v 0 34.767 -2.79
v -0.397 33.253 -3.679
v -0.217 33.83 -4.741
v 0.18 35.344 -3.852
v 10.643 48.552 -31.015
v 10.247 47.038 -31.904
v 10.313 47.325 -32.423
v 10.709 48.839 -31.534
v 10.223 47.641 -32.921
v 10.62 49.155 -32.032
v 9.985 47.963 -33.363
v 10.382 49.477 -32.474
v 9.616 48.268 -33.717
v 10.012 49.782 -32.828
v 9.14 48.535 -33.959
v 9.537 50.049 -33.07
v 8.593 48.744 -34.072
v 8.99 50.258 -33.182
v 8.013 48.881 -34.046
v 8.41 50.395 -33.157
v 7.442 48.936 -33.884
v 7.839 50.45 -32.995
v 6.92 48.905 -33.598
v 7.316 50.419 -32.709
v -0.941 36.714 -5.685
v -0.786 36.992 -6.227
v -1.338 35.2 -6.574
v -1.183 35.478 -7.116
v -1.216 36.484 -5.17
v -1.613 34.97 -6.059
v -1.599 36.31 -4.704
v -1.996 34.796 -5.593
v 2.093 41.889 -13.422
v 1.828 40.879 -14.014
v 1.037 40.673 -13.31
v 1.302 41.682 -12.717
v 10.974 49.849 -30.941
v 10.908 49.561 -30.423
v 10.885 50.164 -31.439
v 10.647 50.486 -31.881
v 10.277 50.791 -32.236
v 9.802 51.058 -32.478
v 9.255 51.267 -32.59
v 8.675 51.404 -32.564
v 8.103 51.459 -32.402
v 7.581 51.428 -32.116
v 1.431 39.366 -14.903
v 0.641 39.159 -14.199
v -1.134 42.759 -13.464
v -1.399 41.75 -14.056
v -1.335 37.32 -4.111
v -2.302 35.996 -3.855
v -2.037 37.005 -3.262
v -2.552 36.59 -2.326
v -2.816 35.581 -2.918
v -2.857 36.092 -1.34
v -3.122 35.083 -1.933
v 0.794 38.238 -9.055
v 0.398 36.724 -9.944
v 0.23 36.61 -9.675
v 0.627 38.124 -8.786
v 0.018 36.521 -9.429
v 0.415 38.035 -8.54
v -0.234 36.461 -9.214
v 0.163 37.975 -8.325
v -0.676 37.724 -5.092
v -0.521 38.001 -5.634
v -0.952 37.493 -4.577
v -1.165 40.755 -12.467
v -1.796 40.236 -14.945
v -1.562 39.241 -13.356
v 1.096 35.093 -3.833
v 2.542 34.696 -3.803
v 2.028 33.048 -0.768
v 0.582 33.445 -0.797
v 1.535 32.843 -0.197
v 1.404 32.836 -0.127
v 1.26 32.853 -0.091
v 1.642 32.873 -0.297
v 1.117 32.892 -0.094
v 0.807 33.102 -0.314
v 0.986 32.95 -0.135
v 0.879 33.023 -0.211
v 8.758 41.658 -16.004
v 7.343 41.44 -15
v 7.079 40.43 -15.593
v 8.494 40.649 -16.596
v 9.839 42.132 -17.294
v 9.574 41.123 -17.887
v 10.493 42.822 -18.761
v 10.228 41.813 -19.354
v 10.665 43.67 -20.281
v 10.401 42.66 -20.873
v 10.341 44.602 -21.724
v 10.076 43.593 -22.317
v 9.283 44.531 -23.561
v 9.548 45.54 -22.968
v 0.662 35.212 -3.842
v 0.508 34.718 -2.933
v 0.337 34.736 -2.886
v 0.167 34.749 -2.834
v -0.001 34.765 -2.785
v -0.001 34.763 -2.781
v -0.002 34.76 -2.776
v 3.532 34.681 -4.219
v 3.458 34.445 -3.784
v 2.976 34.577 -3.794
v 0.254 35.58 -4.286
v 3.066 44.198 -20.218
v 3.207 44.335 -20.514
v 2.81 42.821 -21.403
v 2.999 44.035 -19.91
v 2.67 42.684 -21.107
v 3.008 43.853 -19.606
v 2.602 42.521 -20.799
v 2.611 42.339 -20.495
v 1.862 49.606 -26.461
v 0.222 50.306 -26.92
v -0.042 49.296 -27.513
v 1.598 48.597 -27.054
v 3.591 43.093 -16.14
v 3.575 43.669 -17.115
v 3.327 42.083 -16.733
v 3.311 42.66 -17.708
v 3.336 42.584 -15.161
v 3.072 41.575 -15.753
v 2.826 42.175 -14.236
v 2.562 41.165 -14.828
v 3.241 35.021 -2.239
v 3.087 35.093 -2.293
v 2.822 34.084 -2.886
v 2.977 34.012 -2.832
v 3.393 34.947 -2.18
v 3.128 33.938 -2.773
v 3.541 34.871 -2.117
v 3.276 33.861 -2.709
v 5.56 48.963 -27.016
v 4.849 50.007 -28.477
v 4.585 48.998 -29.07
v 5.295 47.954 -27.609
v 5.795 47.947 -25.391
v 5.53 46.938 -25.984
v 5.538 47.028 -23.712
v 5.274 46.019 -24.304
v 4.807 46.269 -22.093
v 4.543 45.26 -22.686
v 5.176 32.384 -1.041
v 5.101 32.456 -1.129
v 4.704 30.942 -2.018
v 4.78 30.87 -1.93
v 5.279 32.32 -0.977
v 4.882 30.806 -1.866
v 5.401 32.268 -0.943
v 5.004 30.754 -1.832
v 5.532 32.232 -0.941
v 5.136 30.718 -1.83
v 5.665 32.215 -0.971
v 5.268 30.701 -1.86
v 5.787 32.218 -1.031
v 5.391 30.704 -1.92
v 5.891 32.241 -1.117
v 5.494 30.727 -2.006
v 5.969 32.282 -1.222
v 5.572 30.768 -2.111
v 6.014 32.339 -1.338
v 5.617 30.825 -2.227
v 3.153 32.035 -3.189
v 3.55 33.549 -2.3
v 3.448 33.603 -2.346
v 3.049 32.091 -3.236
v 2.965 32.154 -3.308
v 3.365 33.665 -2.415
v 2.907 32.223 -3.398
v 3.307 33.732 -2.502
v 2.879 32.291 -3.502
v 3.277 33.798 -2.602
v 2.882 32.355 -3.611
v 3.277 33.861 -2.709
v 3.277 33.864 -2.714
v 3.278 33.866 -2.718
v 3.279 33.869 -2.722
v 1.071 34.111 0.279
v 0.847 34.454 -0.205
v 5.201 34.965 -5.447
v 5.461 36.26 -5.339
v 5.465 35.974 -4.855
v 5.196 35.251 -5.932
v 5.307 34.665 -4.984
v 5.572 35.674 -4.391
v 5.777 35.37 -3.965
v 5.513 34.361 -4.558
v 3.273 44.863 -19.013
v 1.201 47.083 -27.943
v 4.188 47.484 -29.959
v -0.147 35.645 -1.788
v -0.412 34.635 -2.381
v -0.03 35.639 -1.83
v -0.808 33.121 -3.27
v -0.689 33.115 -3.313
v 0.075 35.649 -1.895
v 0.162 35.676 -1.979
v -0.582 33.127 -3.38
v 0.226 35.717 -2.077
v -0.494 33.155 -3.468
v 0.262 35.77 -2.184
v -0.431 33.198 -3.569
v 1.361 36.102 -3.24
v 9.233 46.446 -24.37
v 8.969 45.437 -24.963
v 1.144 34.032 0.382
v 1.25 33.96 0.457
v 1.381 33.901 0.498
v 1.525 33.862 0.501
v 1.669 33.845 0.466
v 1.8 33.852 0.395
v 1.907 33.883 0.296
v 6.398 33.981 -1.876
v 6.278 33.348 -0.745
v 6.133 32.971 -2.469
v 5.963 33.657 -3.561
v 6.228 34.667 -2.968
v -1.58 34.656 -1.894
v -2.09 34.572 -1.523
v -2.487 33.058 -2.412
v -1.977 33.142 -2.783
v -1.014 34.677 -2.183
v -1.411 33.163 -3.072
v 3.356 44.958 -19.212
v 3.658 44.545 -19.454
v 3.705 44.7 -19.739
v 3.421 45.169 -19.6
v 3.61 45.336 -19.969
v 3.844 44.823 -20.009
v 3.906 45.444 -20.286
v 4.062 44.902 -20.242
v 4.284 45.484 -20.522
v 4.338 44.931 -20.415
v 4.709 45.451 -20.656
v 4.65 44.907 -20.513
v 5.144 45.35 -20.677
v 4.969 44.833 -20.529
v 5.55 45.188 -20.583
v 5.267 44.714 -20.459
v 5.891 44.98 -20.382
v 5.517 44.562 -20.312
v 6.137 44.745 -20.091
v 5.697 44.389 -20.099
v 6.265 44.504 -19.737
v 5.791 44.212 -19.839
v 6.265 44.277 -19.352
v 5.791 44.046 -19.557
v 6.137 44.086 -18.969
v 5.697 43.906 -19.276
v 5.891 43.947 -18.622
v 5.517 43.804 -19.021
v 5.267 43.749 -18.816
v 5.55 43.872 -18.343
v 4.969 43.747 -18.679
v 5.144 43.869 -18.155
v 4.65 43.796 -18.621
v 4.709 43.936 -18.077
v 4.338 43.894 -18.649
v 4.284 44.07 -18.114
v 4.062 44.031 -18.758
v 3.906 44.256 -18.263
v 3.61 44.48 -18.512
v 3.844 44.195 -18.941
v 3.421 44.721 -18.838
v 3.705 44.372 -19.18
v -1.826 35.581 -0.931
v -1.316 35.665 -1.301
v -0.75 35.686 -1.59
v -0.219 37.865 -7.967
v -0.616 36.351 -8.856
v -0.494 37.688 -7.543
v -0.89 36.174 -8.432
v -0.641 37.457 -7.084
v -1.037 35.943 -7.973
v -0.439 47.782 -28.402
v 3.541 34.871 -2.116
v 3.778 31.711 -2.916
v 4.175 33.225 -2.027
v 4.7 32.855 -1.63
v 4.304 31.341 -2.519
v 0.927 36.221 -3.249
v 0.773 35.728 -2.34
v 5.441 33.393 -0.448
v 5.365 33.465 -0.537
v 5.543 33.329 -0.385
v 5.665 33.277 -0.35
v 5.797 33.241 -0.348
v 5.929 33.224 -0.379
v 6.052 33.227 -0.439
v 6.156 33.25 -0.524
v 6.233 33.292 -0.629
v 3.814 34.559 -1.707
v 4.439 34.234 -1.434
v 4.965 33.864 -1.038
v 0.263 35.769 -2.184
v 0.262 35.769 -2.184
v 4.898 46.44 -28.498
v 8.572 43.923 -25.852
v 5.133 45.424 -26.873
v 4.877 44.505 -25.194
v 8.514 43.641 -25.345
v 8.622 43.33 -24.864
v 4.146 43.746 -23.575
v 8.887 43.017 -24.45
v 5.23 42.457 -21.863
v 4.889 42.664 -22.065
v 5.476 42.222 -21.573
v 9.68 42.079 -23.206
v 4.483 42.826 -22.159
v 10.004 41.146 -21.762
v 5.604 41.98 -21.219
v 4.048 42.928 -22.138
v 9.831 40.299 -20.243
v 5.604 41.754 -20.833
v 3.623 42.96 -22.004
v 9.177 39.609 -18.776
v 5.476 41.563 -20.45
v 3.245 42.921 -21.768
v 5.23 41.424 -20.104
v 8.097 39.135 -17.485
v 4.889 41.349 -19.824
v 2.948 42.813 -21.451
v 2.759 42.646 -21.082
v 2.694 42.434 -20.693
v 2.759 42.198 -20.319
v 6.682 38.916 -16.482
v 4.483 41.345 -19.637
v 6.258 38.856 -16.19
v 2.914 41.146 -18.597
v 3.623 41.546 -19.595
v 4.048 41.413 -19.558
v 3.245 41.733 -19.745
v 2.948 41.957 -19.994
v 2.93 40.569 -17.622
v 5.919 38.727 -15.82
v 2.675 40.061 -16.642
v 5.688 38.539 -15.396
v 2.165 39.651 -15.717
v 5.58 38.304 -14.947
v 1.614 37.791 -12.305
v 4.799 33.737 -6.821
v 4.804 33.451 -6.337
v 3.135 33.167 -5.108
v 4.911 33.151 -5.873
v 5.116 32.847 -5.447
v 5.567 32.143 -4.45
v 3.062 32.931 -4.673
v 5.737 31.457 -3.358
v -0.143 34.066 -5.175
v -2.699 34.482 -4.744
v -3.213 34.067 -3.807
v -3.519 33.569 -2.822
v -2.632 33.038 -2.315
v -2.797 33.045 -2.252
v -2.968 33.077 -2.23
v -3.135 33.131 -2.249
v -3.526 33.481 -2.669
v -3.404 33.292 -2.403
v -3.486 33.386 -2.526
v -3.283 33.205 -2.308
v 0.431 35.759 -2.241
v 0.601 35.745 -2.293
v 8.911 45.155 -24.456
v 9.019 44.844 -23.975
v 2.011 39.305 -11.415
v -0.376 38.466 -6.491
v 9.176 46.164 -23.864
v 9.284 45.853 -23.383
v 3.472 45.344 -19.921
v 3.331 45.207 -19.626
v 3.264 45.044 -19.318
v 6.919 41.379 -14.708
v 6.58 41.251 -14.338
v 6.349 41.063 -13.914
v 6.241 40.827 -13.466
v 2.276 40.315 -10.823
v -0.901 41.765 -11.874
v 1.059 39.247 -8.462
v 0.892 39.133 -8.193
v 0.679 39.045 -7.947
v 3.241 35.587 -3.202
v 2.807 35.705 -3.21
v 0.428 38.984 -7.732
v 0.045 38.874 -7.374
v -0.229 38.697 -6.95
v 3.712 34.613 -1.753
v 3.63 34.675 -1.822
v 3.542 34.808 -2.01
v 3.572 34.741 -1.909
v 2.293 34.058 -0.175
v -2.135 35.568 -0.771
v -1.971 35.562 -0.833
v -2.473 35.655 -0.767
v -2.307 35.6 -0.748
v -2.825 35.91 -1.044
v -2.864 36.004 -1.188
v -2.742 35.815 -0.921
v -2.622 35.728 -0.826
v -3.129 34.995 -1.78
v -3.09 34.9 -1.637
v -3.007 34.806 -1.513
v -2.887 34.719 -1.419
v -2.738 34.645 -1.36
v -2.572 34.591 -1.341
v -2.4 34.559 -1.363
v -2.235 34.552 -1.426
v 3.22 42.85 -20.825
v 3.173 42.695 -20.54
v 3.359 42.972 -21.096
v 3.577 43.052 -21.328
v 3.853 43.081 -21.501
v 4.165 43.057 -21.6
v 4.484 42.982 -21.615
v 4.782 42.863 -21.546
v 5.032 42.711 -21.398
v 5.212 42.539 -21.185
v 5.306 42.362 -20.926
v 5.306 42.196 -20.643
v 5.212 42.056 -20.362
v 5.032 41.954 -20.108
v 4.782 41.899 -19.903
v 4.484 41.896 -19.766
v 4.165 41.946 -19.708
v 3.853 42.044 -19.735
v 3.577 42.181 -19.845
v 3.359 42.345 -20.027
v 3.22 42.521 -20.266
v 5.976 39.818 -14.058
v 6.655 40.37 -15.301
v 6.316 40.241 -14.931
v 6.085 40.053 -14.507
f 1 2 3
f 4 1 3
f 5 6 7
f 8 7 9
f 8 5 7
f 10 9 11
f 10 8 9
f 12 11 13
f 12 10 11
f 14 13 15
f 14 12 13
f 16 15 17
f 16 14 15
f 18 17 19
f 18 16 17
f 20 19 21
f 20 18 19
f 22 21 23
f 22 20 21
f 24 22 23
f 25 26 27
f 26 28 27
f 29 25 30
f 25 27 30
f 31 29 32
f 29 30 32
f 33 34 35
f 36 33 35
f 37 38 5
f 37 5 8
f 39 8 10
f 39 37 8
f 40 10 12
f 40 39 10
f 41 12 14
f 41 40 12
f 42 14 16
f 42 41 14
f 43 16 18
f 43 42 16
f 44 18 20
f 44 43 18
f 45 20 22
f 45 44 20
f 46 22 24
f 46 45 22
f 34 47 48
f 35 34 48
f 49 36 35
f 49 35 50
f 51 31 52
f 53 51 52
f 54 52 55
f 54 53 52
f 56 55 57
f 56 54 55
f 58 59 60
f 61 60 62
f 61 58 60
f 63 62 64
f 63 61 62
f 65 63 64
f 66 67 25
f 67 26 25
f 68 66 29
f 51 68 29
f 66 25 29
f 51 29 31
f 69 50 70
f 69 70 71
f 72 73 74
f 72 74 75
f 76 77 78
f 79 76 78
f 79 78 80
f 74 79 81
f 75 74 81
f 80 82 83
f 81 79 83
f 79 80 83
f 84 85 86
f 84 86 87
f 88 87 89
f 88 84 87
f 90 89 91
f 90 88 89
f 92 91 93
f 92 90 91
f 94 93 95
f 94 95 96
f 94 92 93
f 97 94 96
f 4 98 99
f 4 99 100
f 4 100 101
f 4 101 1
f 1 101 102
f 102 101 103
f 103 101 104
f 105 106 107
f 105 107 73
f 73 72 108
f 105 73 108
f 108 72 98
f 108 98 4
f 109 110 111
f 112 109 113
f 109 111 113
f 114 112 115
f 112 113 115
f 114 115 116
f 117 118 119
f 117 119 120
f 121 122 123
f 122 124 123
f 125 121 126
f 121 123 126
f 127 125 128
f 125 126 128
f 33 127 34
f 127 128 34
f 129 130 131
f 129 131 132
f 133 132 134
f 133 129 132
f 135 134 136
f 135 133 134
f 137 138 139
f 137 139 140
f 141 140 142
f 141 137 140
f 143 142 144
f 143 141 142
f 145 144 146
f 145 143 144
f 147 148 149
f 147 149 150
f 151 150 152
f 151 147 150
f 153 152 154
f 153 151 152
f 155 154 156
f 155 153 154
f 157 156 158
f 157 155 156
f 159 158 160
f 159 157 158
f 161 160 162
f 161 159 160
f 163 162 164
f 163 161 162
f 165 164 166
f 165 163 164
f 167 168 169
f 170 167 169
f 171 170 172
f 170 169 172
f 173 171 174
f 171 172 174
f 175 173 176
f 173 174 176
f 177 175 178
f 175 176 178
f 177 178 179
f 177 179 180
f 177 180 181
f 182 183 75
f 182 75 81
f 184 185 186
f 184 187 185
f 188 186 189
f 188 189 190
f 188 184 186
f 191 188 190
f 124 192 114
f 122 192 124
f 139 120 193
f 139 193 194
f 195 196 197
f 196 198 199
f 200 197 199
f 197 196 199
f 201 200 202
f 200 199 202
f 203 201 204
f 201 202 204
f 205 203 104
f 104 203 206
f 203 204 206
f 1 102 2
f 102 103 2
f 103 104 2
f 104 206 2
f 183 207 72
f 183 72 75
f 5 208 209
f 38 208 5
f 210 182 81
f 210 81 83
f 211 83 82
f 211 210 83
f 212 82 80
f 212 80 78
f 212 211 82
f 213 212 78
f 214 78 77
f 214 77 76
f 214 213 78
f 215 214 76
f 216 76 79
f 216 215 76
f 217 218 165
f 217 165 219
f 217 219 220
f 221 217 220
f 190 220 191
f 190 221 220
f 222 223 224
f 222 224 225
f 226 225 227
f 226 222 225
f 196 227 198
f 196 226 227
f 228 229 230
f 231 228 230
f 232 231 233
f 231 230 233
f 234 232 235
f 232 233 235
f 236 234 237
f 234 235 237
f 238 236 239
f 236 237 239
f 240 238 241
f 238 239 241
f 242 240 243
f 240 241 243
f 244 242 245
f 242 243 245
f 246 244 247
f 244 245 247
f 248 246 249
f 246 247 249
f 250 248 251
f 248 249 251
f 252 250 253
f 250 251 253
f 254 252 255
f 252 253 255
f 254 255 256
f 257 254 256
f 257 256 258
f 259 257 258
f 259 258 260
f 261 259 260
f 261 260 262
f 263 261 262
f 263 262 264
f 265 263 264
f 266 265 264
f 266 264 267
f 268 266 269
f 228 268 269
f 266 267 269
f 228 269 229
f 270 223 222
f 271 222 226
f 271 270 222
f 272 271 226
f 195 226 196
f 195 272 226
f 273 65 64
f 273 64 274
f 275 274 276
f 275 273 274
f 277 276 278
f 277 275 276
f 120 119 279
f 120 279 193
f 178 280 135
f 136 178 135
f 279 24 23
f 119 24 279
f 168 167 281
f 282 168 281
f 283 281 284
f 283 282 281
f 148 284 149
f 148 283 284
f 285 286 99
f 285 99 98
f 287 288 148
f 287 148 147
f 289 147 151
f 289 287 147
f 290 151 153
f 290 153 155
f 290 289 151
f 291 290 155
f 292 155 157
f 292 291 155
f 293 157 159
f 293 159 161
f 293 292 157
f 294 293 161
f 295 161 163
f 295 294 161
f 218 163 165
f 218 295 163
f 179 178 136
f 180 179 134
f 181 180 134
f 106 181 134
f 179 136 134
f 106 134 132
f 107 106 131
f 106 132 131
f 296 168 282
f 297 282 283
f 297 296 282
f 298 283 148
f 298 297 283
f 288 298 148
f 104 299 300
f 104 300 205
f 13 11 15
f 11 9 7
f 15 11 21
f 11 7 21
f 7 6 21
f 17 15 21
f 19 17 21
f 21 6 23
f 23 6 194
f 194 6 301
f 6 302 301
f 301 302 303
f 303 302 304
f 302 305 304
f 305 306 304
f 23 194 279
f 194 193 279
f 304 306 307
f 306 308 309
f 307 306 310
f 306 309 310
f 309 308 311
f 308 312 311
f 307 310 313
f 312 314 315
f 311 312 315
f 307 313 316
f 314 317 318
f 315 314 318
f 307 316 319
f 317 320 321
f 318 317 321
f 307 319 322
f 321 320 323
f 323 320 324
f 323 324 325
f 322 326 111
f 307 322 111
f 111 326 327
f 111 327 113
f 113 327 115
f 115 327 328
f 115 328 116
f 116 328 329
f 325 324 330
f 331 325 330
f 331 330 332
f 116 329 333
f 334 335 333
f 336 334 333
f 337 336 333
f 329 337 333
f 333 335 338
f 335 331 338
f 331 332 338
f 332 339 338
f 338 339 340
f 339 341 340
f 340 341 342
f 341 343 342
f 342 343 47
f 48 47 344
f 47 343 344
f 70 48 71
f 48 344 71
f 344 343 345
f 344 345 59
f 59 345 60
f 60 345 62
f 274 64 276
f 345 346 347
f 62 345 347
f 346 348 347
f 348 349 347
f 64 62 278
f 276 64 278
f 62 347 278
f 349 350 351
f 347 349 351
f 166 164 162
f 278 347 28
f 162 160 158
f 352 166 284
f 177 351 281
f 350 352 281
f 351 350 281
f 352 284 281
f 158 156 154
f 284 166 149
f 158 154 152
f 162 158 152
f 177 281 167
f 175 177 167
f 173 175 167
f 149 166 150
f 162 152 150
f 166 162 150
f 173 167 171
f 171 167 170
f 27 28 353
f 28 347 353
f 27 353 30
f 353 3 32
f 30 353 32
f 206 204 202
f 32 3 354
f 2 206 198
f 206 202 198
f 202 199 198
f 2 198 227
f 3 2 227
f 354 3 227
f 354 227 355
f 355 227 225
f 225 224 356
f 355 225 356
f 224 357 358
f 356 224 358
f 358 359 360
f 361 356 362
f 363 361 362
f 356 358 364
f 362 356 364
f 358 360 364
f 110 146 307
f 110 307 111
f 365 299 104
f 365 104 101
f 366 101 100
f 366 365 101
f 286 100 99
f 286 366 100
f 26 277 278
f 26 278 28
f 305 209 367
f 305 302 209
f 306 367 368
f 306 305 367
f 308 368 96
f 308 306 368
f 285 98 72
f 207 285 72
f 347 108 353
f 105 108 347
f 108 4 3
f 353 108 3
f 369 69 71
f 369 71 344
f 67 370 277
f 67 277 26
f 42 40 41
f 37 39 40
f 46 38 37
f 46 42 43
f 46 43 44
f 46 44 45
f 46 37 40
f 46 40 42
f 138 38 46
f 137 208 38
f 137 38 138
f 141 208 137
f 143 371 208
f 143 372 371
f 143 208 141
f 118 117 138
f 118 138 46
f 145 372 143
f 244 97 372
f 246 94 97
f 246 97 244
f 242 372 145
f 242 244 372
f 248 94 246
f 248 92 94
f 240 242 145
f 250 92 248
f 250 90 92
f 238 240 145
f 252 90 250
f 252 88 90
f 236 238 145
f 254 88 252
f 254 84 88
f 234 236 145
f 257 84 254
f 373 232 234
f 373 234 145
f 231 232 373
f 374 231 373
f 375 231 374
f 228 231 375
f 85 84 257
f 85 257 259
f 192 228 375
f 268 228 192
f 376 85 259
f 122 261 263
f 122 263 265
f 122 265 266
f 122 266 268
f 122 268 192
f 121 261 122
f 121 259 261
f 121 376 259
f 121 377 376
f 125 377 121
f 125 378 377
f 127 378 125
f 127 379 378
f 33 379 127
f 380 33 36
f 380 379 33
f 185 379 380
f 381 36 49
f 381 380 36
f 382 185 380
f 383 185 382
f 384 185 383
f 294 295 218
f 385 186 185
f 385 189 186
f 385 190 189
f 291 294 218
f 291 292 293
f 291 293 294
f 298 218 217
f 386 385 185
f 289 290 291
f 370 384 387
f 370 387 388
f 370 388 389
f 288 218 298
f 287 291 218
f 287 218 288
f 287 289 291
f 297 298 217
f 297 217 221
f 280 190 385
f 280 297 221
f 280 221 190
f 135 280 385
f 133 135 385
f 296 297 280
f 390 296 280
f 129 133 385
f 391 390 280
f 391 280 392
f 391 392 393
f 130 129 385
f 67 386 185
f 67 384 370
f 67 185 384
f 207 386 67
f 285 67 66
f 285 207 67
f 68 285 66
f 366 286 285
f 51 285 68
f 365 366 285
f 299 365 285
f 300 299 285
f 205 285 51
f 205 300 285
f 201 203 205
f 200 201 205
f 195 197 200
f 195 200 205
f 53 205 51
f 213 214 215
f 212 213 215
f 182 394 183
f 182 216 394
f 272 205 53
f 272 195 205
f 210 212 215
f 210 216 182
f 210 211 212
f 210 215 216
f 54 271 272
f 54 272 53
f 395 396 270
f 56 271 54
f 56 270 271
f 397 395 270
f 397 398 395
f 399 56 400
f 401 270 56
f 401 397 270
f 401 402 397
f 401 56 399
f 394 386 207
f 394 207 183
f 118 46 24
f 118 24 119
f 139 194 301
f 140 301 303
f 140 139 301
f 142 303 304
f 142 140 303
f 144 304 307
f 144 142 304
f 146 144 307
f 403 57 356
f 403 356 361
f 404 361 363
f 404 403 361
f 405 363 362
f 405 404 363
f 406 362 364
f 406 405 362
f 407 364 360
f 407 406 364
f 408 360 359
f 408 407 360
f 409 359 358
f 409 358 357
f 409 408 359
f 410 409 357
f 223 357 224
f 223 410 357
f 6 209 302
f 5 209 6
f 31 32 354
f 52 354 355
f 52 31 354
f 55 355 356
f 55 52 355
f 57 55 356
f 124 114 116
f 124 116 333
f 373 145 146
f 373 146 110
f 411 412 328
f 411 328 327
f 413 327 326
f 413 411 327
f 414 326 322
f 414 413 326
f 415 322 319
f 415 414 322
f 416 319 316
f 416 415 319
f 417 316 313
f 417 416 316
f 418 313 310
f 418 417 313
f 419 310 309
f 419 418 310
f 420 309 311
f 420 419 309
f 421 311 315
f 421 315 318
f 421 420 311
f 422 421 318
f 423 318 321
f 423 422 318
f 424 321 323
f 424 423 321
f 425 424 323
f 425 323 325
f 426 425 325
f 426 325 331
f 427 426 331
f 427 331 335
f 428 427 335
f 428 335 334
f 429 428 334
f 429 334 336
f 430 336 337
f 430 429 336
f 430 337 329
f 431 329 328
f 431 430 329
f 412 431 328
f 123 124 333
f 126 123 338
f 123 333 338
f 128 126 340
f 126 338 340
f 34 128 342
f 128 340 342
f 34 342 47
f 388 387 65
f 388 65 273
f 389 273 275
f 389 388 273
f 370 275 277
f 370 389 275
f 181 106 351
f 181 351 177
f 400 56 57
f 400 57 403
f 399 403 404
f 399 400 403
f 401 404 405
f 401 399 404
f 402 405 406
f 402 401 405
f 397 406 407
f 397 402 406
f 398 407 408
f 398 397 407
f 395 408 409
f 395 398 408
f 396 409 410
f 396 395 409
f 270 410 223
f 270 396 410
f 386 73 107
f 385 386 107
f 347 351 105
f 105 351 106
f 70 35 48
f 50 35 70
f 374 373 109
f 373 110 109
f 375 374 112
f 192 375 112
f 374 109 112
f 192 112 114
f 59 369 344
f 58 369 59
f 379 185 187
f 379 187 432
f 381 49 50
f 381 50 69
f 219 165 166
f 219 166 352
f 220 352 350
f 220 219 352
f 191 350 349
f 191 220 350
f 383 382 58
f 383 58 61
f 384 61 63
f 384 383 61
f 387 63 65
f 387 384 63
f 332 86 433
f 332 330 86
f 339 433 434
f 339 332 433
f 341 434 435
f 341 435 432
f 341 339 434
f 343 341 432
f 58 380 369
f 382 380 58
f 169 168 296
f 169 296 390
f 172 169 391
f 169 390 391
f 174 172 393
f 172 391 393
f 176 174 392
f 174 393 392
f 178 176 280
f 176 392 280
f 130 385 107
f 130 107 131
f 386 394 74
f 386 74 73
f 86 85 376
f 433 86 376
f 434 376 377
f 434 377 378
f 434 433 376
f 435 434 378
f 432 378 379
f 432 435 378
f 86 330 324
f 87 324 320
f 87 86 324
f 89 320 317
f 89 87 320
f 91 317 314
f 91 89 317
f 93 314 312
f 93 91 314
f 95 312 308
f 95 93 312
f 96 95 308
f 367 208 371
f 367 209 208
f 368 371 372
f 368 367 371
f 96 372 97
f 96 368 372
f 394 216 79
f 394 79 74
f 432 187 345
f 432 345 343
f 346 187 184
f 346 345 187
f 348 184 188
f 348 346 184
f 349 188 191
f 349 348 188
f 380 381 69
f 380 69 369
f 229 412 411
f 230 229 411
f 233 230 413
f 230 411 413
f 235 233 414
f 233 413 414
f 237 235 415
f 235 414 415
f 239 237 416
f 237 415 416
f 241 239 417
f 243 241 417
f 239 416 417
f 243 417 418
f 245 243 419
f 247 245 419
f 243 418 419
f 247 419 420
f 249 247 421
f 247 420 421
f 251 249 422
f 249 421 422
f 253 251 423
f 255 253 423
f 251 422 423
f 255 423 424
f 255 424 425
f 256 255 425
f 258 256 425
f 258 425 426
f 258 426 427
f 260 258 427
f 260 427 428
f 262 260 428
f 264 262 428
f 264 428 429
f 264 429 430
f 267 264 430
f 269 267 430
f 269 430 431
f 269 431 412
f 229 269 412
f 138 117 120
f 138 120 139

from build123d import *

# Parameters (mm, degrees)
BOSS_EXTRU_1_DEPTH      = 1.2
BOSS_EXTRU_2_DEPTH      = 1.8
BOSS_EXTRU_3_DEPTH      = 1.2
ENL_V_MAT_EXTRU_1_DEPTH = 0.5
D_GAGEMENT_11_D         = 2.2
D_GAGEMENT_11_DEPTH     = 20.852957306
CHANFREIN1_SIZE         = 0.4
CONG_1_R                = 0.5
CONG_2_R                = 1.6
CONG_3_R                = 2
CONG_4_R                = 3
CONG_5_R                = 4.6


with BuildPart() as part:
    # Esquisse1 → Boss.-Extru.1 (new body)
    with BuildSketch(Plane(origin=(6.407585618, 24.446842904, 14.355449102), x_dir=(-0.9673252584845775, 0.25353864458450015, 0), z_dir=(0.22045579862678236, 0.8411043718426235, 0.49390553400326775))):
        with BuildLine():
            Line((8.3107933, -19.201337536), (8.28703703, -20.246295369))
            Line((8.28703703, -20.246295369), (5.887657003, -20.191747407))
            Line((5.887657003, -20.191747407), (5.911413273, -19.146789578))
            ThreePointArc((5.911413273, -19.146789578), (5.661071779, -19.051658576), (5.415896386, -18.943909805))
            Line((5.415896386, -18.943909805), (5.424424098, -18.568804632))
            ThreePointArc((5.424424098, -18.568804632), (4.220103871, -18.05373822), (3.294482937, -17.126966131))
            ThreePointArc((3.294482937, -17.126966131), (2.75302589, -16.9231517), (2.381681142, -17.366794726))
            ThreePointArc((2.381681142, -17.366794726), (2.674699472, -19.679905075), (3.869384364, -21.682170602))
            Line((3.869384364, -21.682170602), (4.36844048, -33.2537312))
            ThreePointArc((4.36844048, -33.2537312), (0.72021692, -37.984660137), (2.965783206, -43.520782952))
            Line((2.965783206, -43.520782952), (2.014262513, -51.497693901))
            ThreePointArc((2.014262513, -51.497693901), (3.190838358, -53.739695244), (5.705653115, -53.445403756))
            Line((5.705653115, -53.445403756), (12.539385017, -47.469897623))
            Line((12.539385017, -47.469897623), (10.775401018, -46.941589091))
            Line((10.775401018, -46.941589091), (7.98794124, -49.26050339))
            ThreePointArc((7.98794124, -49.26050339), (6.551054488, -45.710950333), (7.080832223, -41.918417408))
            Line((7.080832223, -41.918417408), (8.354436867, -38.910332559))
            Line((8.354436867, -38.910332559), (6.961586789, -33.804829327))
            Line((6.961586789, -33.804829327), (9.308655621, -31.135148323))
            Line((9.308655621, -31.135148323), (11.938540853, -31.993635375))
            Line((11.938540853, -31.993635375), (11.460268944, -30.16561351))
            Line((11.460268944, -30.16561351), (8.019985695, -28.956643067))
            Line((8.019985695, -28.956643067), (8.926287357, -26.241418493))
            ThreePointArc((8.926287357, -26.241418493), (9.144900582, -25.787147852), (9.470162743, -25.401975054))
            ThreePointArc((9.470162743, -25.401975054), (9.938854473, -24.754281649), (10.116412195, -23.974761322))
            Line((10.116412195, -23.974761322), (10.163650136, -21.896924134))
            ThreePointArc((10.163650136, -21.896924134), (11.408775744, -20.142199434), (11.914735193, -18.050931496))
            ThreePointArc((11.914735193, -18.050931496), (11.515962336, -17.420273087), (10.787100814, -17.579993788))
            ThreePointArc((10.787100814, -17.579993788), (9.893990524, -18.276347599), (8.823545803, -18.646080909))
            Line((8.823545803, -18.646080909), (8.815018092, -19.021186079))
            ThreePointArc((8.815018092, -19.021186079), (8.565199371, -19.117681561), (8.3107933, -19.201337536))
        make_face()
    extrude(amount=-BOSS_EXTRU_1_DEPTH)

    # Esquisse2 → Boss.-Extru.2 (add)
    with BuildSketch(Plane(origin=(6.14303866, 23.437517658, 13.762762461), x_dir=(0.975396965779486, -0.19010345790327618, -0.11163079521973214), z_dir=(-0.22045579862678244, -0.8411043718426235, -0.493905534003268))):
        with BuildLine():
            Line((-7.732315065, -33.261580929), (-7.492687467, -31.387284642))
            Line((-7.492687467, -31.387284642), (-4.236084553, -29.746645792))
            Line((-4.236084553, -29.746645792), (-5.483474276, -27.170244025))
            ThreePointArc((-5.483474276, -27.170244025), (-5.758598922, -26.747798778), (-6.130618981, -26.407571451))
            ThreePointArc((-6.130618981, -26.407571451), (-6.6785848, -25.825409837), (-6.954750137, -25.075135626))
            Line((-6.954750137, -25.075135626), (-7.268355612, -23.020557711))
            ThreePointArc((-7.268355612, -23.020557711), (-8.728453798, -21.440206536), (-9.498708997, -19.431200941))
            ThreePointArc((-9.498708997, -19.431200941), (-9.184201764, -18.754565869), (-8.440866411, -18.819391589))
            ThreePointArc((-8.440866411, -18.819391589), (-7.465747068, -19.39532291), (-6.356693226, -19.624569933))
            Line((-6.356693226, -19.624569933), (-6.113459598, -21.218108564))
            Line((-6.113459598, -21.218108564), (-2.752387602, -20.7050832))
            Line((-2.752387602, -20.7050832), (-2.99562123, -19.111544567))
            ThreePointArc((-2.99562123, -19.111544567), (-1.86739276, -18.44612655), (-1.068413166, -17.408190027))
            ThreePointArc((-1.068413166, -17.408190027), (-0.557603097, -17.13654848), (-0.132375231, -17.528845966))
            ThreePointArc((-0.132375231, -17.528845966), (-0.126005289, -19.86043312), (-1.053747455, -21.999506214))
            Line((-1.053747455, -21.999506214), (-0.06308502, -33.539378814))
            ThreePointArc((-0.06308502, -33.539378814), (4.162318019, -37.762788918), (2.646077122, -43.541390591))
            Line((2.646077122, -43.541390591), (4.613821412, -51.330131332))
            ThreePointArc((4.613821412, -51.330131332), (3.734816377, -53.704631466), (1.203030531, -53.735634151))
            Line((1.203030531, -53.735634151), (-6.341302035, -48.686910412))
            Line((-6.341302035, -48.686910412), (-4.659741241, -47.936508686))
            Line((-4.659741241, -47.936508686), (-1.59763996, -49.878371526))
            ThreePointArc((-1.59763996, -49.878371526), (-0.628345248, -46.173720638), (-1.640634697, -42.480586398))
            Line((-1.640634697, -42.480586398), (-3.289886063, -39.660903229))
            Line((-3.289886063, -39.660903229), (-2.564020762, -34.418831676))
            Line((-2.564020762, -34.418831676), (-5.234407859, -32.072566236))
            Line((-5.234407859, -32.072566236), (-7.732315065, -33.261580929))
        make_face()
    extrude(amount=BOSS_EXTRU_2_DEPTH)

    # Esquisse3 → Boss.-Extru.3 (add)
    with BuildSketch(Plane(origin=(6.407585618, 24.446842904, 14.355449102), x_dir=(-0.9673252584845775, 0.25353864458450015, 0), z_dir=(0.22045579862678236, 0.8411043718426235, 0.49390553400326775))):
        with BuildLine():
            Line((7.837153276, -20.236067623), (7.91651501, -16.745213642))
            Line((7.91651501, -16.745213642), (7.612088308, -16.189112778))
            ThreePointArc((7.612088308, -16.189112778), (7.184869542, -15.929335708), (6.746286617, -16.169429478))
            Line((6.746286617, -16.169429478), (6.416902492, -16.711121168))
            Line((6.416902492, -16.711121168), (6.337540759, -20.201975149))
            Line((6.337540759, -20.201975149), (7.837153276, -20.236067623))
        make_face()
    extrude(amount=-BOSS_EXTRU_3_DEPTH)

    # Esquisse4 → Enlèv. mat.-Extru.1 (cut)
    with BuildSketch(Plane(origin=(2.951307786, 9.462502662, -17.431643664), x_dir=(0.9891101016622393, -0.07021493892393531, 0.12934863409260489), z_dir=(-0.1471774669904145, -0.47188137397705354, 0.8692909536535013))):
        Polygon((0.512643013, 28.466993484), (-2.801830697, 29.224795587), (-3.203020046, 27.470074211), (0.111453664, 26.712272108), align=None)
    extrude(amount=-ENL_V_MAT_EXTRU_1_DEPTH, mode=Mode.SUBTRACT)

    # Dégagement #11
    with Locations(Plane(origin=(6.407585618, 24.446842904, 14.355449102), x_dir=(0.975396965779486, -0.19010345790327618, -0.11163079521973214), z_dir=(0.22045579862678244, 0.8411043718426235, 0.493905534003268))):
        with Locations((-1.628998725, 39.331434949)):
            Hole(D_GAGEMENT_11_D / 2, depth=D_GAGEMENT_11_DEPTH)

    # Chanfrein1
    chanfrein1_edges = [part.edges().sort_by_distance(p)[0] for p in [
        (5.230234471, 41.940101873, -20.983500369),
        (5.891601867, 44.463414989, -19.501783767),
    ]]
    chamfer(chanfrein1_edges, length=CHANFREIN1_SIZE)

    # Congé1
    # the kernel refuses this fillet: 0.5 mm, written as the material it takes off along each edge
    with BuildSketch(Plane(origin=(-0.669204138, 32.248368886, -3.821283326), x_dir=(0.1471774658030771, 0.4718813743025472, -0.869290953677837), z_dir=(0.2204557986267829, 0.8411043718426239, 0.4939055340032671))) as cong_1_piece_1_section:
        with BuildLine():
            CenterArc((0.390324185, 0.5), CONG_1_R, 196.972621799, 73.027378201)
            ThreePointArc((-0.087897992, 0.354042645), (-0.039267564, 0.178183579), (0, 0))
            Line((0, 0), (0.390324185, 0))
        make_face()
    cong_1_piece_1 = extrude(amount=4.951620926, mode=Mode.PRIVATE)
    cong_1_piece_1 = split(cong_1_piece_1, bisect_by=Plane(origin=(0.003725605, 34.762970093, -2.783803292), z_dir=(-0.22045579862678238, -0.8411043718426235, -0.4939055340032678)), keep=Keep.TOP, mode=Mode.PRIVATE)
    cong_1_piece_1 = cong_1_piece_1 - Plane(origin=(1.037432714, 30.760160969, 0.761385364), x_dir=(-0.25577403854650904, 0.5384942223933797, -0.8028721029245929), z_dir=(0.22045579862678244, 0.8411043718426237, 0.49390553400326787)) * Cylinder(5.260282908, 12, mode=Mode.PRIVATE)
    add(cong_1_piece_1, mode=Mode.SUBTRACT)
    with BuildSketch(Plane(origin=(-0.669204138, 32.248368886, -3.821283326), x_dir=(0.1471774658030771, 0.4718813743025472, -0.869290953677837), z_dir=(0.2204557986267829, 0.8411043718426239, 0.4939055340032671))) as cong_1_piece_2_section:
        with BuildLine():
            CenterArc((0.390324185, 0.5), CONG_1_R, 196.972621799, 73.027378201)
            ThreePointArc((-0.087897992, 0.354042645), (-0.039267564, 0.178183579), (0, 0))
            Line((0, 0), (0.390324185, 0))
        make_face()
    cong_1_piece_2 = extrude(amount=4.951620926, mode=Mode.PRIVATE)
    cong_1_piece_2 = split(cong_1_piece_2, bisect_by=Plane(origin=(-0.122705541, 34.636774261, -2.512463256), z_dir=(-0.22045579862678238, -0.8411043718426235, -0.4939055340032678)), keep=Keep.TOP, mode=Mode.PRIVATE)
    cong_1_piece_2 = cong_1_piece_2 & Plane(origin=(1.037432714, 30.760160969, 0.761385364), x_dir=(-0.25577403854650904, 0.5384942223933797, -0.8028721029245929), z_dir=(0.22045579862678244, 0.8411043718426237, 0.49390553400326787)) * Cylinder(5.260282908, 12, mode=Mode.PRIVATE)
    add(cong_1_piece_2, mode=Mode.SUBTRACT)
    with BuildSketch(Plane(origin=(-0.669204138, 32.248368886, -3.821283326), x_dir=(0.1471774658030771, 0.4718813743025472, -0.869290953677837), z_dir=(0.2204557986267829, 0.8411043718426239, 0.4939055340032671))) as cong_1_piece_3_section:
        with BuildLine():
            CenterArc((0.390324185, 0.5), CONG_1_R, 196.972621799, 73.027378201)
            ThreePointArc((-0.087897992, 0.354042645), (-0.039267564, 0.178183579), (0, 0))
            Line((0, 0), (0.390324185, 0))
        make_face()
    cong_1_piece_3 = extrude(amount=4.951620926, mode=Mode.PRIVATE)
    cong_1_piece_3 = split(cong_1_piece_3, bisect_by=Plane(origin=(-0.122705541, 34.636774261, -2.512463256), z_dir=(0.22045579862678238, 0.8411043718426235, 0.4939055340032678)), keep=Keep.TOP, mode=Mode.PRIVATE)
    cong_1_piece_3 = cong_1_piece_3 & Plane(origin=(1.583239487, 32.842575973, 1.984201853), x_dir=(-0.25577403854650904, 0.5384942223933797, -0.8028721029245929), z_dir=(0.22045579862678244, 0.8411043718426237, 0.49390553400326787)) * Cylinder(5.260282908, 12, mode=Mode.PRIVATE)
    add(cong_1_piece_3, mode=Mode.SUBTRACT)
    with BuildSketch(Plane(origin=(3.221118801, 33.684386414, -2.383102251), x_dir=(0.9003564842206884, -0.3702458044391333, 0.22863999128975734), z_dir=(-0.22045579862678244, -0.8411043718426235, -0.493905534003268))) as cong_1_piece_4:
        with BuildLine():
            CenterArc((0.391217792, -0.49930112), CONG_1_R, 93.029734023, 73.027378136)
            Line((-0.094050404, -0.378823825), (0, 0))
            ThreePointArc((0, 0), (0.182395347, -0.004823551), (0.364790694, 0))
        make_face()
    extrude(amount=2.775810462, mode=Mode.SUBTRACT)
    with BuildSketch(Plane(origin=(3.700788834, 35.514470106, -1.308457423), x_dir=(0.9003564842006331, -0.37024580446021027, 0.2286399913346027), z_dir=(-0.22045579862678238, -0.8411043718426237, -0.49390553400326787))) as cong_1_piece_5_section:
        with BuildLine():
            CenterArc((0.391217792, -0.49930112), CONG_1_R, 93.029734026, 73.027378189)
            Line((-0.094050403, -0.378823826), (0, 0))
            ThreePointArc((0, 0), (0.182395347, -0.004823551), (0.364790695, 0))
        make_face()
    cong_1_piece_5 = extrude(amount=2.175810463, mode=Mode.PRIVATE)
    cong_1_piece_5 = cong_1_piece_5 & Plane(origin=(0.754897734, 33.069656027, 1.967224347), x_dir=(0.43863740070273427, 0.36678352616314214, -0.8204066526059384), z_dir=(0.22045579862678238, 0.8411043718426235, 0.4939055340032678)) * Cylinder(5.260282909, 6, mode=Mode.PRIVATE)
    add(cong_1_piece_5, mode=Mode.SUBTRACT)

    # Congé2
    cong_2_edges = [part.edges().sort_by_distance(p)[0] for p in [
        (2.867957036, 43.89344341, -20.218549127),
    ]]
    fillet(cong_2_edges, radius=CONG_2_R)

    # Congé3
    cong_3_edges = [part.edges().sort_by_distance(p)[0] for p in [
        (8.657877516, 44.729933893, -24.227407519),
        (6.015368983, 40.18030014, -15.300046181),
    ]]
    fillet(cong_3_edges, radius=CONG_3_R)

    # Congé4
    cong_4_edges = [part.edges().sort_by_distance(p)[0] for p in [
        (-1.01263009, 36.223698711, -5.425125631),
        (5.04907985, 34.525256884, -5.238394092),
    ]]
    fillet(cong_4_edges, radius=CONG_4_R)

    # Congé5
    cong_5_edges = [part.edges().sort_by_distance(p)[0] for p in [
        (3.575963848, 41.101059603, -15.779234582),
    ]]
    fillet(cong_5_edges, radius=CONG_5_R)


solid = part.part
